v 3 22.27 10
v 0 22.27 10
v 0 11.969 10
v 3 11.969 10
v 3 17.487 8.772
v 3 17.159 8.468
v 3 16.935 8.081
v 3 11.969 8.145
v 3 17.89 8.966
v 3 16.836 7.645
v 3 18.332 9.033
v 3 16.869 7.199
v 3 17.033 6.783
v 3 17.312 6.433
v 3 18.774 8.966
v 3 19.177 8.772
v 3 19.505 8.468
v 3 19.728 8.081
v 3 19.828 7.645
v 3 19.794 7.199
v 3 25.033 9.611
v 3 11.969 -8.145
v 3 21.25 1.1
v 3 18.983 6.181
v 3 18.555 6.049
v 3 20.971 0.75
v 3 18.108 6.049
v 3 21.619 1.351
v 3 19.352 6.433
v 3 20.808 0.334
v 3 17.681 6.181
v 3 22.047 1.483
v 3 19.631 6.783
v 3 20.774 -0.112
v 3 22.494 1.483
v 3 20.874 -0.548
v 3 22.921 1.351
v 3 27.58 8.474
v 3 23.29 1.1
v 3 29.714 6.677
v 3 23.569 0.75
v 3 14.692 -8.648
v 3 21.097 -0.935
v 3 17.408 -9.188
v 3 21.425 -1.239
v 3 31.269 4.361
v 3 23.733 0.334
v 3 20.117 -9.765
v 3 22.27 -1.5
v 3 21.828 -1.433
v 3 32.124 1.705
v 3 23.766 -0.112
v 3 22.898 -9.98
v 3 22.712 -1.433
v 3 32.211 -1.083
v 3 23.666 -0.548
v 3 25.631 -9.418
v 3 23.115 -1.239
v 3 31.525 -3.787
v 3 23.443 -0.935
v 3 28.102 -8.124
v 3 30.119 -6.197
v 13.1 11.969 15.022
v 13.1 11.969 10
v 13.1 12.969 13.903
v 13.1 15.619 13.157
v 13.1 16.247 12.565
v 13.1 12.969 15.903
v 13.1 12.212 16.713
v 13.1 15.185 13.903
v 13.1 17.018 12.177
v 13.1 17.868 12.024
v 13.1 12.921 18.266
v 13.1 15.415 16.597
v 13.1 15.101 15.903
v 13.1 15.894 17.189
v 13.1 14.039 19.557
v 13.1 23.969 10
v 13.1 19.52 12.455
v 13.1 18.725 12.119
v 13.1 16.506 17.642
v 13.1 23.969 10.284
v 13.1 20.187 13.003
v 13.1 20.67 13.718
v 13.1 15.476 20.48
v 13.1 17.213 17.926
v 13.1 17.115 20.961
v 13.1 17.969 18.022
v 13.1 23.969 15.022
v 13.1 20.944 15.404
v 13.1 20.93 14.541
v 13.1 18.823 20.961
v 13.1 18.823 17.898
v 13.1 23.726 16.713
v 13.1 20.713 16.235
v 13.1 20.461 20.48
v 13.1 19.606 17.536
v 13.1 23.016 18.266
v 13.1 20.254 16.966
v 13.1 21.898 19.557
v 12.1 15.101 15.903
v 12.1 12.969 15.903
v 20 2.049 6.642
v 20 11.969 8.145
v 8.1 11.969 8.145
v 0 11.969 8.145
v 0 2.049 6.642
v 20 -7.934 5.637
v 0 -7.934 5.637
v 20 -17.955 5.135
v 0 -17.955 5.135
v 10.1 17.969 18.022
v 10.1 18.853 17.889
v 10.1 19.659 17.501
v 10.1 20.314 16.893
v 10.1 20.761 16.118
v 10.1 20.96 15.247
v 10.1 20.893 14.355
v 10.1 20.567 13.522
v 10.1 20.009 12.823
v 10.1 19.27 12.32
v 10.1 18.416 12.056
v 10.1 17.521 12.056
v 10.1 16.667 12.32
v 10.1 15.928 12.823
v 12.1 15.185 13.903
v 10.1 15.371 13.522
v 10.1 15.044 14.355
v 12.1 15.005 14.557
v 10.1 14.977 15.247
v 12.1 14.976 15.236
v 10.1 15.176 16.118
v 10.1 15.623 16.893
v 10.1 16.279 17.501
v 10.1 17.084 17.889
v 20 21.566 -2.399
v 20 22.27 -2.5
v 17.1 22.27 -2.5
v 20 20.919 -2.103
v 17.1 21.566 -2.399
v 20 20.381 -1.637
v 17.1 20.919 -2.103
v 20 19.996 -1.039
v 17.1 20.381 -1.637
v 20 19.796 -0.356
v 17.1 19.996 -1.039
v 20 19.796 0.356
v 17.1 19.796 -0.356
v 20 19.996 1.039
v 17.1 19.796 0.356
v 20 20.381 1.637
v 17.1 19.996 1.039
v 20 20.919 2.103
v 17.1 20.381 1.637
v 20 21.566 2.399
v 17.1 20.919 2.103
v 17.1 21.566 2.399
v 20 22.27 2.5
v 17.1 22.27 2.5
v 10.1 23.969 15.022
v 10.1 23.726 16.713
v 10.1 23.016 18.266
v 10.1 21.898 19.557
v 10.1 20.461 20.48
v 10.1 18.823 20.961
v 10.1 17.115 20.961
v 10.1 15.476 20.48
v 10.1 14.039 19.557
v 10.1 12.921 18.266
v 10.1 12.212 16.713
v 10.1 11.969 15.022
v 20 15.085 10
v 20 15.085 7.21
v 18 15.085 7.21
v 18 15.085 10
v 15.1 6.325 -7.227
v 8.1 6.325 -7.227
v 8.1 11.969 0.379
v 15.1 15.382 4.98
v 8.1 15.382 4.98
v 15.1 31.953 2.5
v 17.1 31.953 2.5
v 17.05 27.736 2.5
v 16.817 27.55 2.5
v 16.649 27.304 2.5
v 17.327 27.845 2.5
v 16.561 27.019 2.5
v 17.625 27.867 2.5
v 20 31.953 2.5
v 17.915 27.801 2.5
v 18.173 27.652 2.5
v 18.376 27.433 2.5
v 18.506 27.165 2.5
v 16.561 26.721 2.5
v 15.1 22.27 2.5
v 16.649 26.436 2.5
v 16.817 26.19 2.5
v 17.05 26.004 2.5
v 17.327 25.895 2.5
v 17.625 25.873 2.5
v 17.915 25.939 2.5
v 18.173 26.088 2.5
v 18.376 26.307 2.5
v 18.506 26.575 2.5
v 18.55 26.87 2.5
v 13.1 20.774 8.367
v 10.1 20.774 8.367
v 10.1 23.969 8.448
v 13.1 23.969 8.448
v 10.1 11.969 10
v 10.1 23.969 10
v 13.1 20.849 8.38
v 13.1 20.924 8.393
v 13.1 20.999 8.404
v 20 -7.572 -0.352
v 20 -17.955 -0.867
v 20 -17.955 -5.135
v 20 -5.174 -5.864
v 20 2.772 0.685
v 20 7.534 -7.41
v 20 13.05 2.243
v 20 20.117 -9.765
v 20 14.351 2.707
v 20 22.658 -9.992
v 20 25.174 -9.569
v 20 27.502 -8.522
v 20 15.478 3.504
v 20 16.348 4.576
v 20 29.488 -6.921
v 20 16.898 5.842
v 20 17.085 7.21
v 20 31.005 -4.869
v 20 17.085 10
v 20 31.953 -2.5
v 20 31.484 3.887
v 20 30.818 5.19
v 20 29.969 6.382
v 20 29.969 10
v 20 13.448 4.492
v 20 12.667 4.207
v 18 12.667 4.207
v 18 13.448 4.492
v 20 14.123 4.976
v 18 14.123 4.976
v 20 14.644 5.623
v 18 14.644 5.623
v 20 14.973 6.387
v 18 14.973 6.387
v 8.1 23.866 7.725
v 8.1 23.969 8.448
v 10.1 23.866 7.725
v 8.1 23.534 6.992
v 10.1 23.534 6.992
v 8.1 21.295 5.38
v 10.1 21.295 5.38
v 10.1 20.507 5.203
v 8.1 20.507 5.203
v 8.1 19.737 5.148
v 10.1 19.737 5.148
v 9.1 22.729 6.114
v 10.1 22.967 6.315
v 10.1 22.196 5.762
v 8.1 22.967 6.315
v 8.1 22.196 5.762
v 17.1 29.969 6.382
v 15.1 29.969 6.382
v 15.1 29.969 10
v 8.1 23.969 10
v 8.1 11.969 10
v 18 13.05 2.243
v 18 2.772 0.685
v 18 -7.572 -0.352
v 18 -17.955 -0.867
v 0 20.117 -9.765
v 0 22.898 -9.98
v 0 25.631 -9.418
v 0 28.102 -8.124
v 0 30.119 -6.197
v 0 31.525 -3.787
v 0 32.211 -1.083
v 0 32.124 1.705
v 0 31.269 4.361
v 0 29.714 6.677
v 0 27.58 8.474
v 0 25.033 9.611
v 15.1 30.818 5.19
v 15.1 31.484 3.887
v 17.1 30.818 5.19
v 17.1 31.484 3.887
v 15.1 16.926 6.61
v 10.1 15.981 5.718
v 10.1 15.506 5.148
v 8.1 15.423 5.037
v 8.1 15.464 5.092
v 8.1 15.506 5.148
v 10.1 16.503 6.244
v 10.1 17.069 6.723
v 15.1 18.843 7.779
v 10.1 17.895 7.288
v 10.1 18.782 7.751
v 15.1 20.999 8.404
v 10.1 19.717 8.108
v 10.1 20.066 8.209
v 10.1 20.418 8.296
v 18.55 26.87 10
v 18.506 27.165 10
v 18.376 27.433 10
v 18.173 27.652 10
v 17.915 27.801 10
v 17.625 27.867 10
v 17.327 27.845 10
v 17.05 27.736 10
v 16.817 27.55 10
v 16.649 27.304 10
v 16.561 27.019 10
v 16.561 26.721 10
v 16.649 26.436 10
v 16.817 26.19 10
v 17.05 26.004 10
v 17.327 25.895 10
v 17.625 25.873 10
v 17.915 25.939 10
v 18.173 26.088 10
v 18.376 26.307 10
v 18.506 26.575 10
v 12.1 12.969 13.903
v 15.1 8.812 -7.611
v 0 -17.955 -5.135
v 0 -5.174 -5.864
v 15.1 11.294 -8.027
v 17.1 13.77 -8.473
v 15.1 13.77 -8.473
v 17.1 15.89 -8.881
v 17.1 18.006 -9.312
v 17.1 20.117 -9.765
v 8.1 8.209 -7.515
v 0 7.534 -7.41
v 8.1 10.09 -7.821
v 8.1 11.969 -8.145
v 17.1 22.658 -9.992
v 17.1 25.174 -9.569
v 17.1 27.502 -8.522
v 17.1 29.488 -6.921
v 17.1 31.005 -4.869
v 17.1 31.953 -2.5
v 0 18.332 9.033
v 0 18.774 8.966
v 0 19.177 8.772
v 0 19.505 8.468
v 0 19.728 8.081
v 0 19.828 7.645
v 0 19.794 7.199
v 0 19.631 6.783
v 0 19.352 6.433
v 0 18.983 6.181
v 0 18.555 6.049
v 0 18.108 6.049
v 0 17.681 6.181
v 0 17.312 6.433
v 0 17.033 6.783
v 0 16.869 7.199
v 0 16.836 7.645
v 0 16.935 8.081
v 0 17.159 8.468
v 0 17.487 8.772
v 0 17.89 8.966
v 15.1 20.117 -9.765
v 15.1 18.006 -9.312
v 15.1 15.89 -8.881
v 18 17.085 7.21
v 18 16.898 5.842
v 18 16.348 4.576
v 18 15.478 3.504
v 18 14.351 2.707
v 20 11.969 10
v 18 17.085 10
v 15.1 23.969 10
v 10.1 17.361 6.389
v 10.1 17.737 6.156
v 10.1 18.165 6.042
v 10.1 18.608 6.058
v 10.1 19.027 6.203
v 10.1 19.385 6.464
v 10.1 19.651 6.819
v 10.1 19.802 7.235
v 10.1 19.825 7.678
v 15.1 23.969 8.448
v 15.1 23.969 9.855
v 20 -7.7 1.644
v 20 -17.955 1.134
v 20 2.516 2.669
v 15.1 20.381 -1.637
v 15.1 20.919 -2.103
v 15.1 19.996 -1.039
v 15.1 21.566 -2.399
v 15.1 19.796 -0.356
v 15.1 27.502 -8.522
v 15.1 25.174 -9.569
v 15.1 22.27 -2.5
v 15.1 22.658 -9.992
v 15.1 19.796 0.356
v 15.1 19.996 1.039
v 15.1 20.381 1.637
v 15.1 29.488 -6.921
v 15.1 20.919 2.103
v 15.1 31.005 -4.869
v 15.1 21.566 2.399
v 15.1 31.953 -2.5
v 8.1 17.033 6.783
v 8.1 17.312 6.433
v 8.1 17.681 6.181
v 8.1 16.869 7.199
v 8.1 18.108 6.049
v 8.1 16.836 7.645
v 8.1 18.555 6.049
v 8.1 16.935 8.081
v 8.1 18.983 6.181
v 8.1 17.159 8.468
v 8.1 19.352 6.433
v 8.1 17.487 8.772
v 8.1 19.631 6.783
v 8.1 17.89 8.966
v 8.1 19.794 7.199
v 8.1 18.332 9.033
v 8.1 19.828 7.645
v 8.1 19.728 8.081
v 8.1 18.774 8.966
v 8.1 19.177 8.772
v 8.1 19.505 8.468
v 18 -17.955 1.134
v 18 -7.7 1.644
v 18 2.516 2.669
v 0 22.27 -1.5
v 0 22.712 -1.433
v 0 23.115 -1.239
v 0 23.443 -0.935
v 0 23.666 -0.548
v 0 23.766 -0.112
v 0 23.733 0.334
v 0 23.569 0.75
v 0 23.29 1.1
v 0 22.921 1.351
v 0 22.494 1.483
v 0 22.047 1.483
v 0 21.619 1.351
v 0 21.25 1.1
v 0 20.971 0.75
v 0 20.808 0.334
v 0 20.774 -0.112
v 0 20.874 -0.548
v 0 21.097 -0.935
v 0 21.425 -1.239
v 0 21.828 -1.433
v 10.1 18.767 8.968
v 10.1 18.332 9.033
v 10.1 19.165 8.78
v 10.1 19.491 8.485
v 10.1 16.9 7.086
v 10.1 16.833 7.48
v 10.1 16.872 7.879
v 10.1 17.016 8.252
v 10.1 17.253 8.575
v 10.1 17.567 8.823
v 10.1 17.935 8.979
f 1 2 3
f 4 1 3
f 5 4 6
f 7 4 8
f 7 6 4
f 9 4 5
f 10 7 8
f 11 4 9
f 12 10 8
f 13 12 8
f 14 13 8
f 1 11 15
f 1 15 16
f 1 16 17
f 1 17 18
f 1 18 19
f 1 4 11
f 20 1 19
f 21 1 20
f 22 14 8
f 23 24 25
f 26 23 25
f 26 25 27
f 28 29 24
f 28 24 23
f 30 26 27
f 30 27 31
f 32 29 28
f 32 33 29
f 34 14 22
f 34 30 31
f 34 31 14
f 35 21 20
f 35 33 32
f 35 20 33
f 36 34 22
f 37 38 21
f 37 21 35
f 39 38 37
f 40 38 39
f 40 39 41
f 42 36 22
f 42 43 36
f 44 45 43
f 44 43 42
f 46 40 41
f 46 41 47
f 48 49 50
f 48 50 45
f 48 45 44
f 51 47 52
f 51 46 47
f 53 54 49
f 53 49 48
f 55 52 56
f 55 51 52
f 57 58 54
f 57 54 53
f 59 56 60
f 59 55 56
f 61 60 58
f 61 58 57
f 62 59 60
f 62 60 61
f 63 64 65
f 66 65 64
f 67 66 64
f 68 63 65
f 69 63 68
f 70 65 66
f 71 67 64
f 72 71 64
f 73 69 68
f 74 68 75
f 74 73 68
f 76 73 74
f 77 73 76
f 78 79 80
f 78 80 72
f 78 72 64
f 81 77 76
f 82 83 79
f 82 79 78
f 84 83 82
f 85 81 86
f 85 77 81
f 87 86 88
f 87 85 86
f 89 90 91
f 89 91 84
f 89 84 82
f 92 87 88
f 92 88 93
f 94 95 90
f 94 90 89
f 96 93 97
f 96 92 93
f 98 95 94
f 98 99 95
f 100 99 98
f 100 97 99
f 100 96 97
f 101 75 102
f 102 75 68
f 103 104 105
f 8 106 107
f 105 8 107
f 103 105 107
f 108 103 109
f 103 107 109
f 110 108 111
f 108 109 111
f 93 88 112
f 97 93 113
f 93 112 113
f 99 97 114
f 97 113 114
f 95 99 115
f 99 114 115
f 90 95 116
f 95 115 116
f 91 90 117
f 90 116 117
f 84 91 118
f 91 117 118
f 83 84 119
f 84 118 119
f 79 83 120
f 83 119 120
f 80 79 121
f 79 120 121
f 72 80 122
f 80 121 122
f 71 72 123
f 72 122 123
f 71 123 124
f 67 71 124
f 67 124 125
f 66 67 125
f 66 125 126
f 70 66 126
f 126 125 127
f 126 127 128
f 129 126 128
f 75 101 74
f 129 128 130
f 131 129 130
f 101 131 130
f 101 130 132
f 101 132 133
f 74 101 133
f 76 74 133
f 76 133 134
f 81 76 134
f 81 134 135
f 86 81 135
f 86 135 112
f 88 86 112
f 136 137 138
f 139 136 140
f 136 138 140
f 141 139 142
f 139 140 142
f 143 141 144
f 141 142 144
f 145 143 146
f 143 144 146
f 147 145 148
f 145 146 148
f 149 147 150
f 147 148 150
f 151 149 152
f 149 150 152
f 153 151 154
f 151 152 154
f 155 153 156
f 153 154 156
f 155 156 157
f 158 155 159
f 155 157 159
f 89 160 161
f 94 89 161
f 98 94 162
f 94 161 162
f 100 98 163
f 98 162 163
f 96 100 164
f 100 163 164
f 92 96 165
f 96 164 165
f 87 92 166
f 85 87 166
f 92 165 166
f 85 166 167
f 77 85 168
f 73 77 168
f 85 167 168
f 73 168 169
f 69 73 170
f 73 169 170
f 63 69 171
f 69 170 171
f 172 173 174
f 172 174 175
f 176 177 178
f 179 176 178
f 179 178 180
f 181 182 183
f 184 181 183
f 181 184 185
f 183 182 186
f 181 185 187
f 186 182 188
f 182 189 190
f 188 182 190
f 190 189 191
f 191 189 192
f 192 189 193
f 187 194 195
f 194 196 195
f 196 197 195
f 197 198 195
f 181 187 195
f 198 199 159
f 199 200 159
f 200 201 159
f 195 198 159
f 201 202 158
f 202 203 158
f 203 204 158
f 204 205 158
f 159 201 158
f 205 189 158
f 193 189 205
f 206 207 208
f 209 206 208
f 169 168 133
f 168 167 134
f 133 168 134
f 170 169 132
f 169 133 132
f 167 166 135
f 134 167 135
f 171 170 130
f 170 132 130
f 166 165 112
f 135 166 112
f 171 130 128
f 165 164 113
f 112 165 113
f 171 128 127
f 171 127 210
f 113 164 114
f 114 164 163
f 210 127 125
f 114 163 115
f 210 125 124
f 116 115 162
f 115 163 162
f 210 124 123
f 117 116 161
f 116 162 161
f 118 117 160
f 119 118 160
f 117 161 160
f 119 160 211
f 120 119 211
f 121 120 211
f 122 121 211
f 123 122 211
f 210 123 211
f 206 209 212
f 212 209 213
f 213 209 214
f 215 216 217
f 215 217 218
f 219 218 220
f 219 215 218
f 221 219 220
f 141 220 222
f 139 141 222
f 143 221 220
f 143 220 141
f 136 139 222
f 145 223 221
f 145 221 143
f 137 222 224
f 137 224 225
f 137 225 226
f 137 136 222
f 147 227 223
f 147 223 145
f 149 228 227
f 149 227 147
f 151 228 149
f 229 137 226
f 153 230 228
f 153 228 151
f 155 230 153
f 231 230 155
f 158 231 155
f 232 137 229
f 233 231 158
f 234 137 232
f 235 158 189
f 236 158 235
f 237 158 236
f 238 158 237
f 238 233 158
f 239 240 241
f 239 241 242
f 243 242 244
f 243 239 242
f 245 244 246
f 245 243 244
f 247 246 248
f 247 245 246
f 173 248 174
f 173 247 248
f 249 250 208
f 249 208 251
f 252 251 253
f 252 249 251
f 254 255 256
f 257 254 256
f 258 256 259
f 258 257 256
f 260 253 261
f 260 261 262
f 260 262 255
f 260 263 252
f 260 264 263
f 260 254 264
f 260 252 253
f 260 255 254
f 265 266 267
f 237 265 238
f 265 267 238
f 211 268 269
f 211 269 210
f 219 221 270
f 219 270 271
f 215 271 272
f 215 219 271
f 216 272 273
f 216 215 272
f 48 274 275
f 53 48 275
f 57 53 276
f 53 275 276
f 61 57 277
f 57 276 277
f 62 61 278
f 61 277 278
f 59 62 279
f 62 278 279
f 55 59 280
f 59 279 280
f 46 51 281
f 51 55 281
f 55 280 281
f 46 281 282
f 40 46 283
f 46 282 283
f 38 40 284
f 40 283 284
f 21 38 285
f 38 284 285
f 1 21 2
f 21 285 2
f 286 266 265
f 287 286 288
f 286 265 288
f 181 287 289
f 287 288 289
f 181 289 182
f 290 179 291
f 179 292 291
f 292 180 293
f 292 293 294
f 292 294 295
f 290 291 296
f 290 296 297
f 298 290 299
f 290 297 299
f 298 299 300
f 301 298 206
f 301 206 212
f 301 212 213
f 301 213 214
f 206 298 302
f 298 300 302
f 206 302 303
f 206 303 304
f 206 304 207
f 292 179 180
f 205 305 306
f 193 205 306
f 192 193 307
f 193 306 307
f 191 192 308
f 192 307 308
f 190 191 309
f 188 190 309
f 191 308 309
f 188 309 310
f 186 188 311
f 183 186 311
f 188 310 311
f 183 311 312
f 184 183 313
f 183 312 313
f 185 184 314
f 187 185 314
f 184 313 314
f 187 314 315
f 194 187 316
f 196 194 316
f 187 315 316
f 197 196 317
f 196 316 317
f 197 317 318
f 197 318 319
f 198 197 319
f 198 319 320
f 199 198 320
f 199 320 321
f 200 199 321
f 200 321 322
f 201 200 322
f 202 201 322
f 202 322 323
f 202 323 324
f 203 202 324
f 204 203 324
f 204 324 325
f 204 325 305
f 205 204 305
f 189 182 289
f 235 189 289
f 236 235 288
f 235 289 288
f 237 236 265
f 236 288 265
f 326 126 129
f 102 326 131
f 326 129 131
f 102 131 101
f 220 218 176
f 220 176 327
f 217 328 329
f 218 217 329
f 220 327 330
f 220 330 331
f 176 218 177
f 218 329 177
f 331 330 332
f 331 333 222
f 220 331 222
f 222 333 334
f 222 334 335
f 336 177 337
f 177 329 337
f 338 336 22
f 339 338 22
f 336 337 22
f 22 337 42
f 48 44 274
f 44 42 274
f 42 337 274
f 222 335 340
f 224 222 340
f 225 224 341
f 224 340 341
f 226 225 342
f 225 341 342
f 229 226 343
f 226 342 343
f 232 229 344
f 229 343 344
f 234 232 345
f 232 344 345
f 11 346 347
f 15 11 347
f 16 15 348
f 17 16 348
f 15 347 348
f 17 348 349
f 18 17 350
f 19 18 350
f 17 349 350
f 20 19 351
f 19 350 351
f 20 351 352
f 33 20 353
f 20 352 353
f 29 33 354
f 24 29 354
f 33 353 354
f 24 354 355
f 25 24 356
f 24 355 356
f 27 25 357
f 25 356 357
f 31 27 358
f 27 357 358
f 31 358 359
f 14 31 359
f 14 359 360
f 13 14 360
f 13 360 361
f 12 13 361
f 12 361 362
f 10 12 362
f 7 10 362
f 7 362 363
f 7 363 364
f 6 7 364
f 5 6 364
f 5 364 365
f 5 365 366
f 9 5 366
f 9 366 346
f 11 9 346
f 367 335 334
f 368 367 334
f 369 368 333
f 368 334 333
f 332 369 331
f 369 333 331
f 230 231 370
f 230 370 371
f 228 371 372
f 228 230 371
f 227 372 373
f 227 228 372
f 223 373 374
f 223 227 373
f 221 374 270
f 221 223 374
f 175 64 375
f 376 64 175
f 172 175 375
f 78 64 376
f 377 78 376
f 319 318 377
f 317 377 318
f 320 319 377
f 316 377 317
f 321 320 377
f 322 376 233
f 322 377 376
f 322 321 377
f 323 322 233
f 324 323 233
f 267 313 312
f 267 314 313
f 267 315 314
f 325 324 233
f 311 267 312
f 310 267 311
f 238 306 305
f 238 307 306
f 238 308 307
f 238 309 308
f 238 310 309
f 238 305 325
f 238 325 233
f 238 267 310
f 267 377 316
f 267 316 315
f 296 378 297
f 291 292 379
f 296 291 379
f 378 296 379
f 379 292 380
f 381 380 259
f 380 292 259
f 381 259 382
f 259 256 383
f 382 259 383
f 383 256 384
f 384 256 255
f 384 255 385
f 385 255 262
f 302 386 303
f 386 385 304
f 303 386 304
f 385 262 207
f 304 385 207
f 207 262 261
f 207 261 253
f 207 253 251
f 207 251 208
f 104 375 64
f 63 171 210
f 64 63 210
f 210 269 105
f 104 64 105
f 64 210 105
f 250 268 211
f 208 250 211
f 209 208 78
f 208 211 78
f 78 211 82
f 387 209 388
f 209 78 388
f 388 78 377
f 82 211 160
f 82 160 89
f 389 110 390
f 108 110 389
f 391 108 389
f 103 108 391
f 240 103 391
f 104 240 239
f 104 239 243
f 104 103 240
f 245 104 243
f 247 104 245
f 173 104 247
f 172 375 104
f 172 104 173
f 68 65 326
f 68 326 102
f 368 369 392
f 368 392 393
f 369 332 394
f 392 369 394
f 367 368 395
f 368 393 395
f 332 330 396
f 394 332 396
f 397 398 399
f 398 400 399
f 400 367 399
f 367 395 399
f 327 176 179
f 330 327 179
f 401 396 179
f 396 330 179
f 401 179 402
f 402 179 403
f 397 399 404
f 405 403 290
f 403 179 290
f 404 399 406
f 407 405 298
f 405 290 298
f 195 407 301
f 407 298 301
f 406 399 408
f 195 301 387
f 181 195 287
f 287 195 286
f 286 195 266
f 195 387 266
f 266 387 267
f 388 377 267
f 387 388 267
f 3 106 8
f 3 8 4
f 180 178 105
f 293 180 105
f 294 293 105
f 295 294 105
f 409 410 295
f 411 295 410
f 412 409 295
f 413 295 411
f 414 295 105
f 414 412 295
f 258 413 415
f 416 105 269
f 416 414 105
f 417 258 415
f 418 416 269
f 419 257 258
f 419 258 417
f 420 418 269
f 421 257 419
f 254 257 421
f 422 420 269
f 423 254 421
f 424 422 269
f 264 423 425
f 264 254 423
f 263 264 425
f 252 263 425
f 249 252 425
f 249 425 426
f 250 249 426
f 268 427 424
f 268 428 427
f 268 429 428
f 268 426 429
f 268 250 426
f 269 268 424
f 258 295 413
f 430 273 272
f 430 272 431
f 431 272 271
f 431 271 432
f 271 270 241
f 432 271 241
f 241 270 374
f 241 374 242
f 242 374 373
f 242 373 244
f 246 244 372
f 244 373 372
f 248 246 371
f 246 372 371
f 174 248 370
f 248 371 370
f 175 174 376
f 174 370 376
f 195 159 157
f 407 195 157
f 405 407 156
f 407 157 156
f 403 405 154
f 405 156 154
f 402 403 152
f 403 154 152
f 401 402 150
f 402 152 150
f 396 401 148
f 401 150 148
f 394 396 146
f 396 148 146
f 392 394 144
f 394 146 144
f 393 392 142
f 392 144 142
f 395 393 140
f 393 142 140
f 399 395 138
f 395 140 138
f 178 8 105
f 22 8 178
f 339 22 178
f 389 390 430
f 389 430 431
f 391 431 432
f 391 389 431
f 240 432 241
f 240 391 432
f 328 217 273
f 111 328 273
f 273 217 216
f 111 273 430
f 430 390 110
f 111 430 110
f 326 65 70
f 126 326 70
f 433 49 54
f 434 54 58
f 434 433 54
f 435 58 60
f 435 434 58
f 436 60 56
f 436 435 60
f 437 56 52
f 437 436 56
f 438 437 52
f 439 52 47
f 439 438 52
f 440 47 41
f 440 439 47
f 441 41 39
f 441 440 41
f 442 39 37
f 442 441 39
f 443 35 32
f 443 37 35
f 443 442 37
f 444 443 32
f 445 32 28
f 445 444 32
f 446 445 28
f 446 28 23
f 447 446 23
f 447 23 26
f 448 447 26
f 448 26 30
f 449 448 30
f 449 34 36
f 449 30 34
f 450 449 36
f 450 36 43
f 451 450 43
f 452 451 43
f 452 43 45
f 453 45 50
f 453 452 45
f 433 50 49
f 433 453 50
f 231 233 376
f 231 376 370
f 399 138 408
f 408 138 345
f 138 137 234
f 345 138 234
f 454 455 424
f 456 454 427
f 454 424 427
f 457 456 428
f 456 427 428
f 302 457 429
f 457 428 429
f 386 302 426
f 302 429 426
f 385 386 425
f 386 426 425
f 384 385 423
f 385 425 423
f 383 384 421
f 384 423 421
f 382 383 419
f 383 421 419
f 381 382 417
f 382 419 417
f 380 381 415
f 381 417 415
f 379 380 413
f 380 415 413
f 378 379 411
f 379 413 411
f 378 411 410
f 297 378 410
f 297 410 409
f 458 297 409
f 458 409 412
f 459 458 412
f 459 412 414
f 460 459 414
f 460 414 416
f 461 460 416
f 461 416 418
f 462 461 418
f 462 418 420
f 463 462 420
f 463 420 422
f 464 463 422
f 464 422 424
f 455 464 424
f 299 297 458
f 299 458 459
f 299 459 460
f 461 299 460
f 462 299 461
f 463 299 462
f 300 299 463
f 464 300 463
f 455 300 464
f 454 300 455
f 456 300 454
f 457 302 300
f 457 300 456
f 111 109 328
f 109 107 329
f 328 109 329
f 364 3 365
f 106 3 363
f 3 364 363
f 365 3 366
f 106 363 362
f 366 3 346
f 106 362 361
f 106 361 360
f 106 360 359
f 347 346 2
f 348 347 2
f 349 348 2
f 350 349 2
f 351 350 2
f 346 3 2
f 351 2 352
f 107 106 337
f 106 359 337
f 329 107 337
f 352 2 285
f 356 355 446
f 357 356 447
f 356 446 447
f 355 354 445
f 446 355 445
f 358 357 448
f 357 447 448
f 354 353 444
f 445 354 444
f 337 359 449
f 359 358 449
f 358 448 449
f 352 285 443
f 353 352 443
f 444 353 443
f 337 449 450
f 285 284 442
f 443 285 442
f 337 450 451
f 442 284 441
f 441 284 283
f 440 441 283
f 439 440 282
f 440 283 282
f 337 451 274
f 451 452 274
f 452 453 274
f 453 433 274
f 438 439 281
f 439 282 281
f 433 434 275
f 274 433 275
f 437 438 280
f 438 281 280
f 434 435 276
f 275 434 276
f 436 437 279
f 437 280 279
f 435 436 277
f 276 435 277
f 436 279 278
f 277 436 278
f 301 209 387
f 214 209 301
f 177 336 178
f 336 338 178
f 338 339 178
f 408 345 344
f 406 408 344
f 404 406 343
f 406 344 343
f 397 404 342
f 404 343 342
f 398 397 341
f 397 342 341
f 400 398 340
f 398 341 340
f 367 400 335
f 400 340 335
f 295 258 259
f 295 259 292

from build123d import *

# Parameters (mm, degrees)
SKETCH1_R                = 1.5
SKETCH1_R_2              = 2.5
BOSS_EXTRUDE1_DEPTH      = 20
SKETCH2_W                = 8.1
SKETCH2_H                = 20
SKETCH2_W_2              = 5.2
SKETCH2_W_3              = 5.1
CUT_EXTRUDE1_DEPTH       = 20
CUT_EXTRUDE1_DEPTH_BACK  = 20
CUT_EXTRUDE2_DEPTH       = 9
BOSS_EXTRUDE2_DEPTH      = 11.9
SKETCH5_R                = 3
BOSS_EXTRUDE3_DEPTH      = 5
CUT_EXTRUDE6_DEPTH       = 1
SKETCH13_R               = 2.5
CUT_EXTRUDE7_DEPTH       = 4
BOSS_EXTRUDE4_DEPTH      = 3
CUT_EXTRUDE9_DEPTH       = 3
SKETCH17_W               = 9
SKETCH17_H               = 3.569322199
CUT_EXTRUDE11_DEPTH      = 3
SKETCH18_W               = 5.770974844
SKETCH18_H               = 0.772936936
BOSS_EXTRUDE5_DEPTH      = 6.9
BOSS_EXTRUDE5_DEPTH_BACK = 1
SKETCH19_W               = 5.1
SKETCH19_H               = 16.397725614
CUT_EXTRUDE12_DEPTH      = 0.301495
SKETCH20_W               = 5
SKETCH20_H               = 12.419235667
CUT_EXTRUDE13_DEPTH      = 10
BOSS_EXTRUDE6_DEPTH      = 2
SKETCH23_W               = 4.9
SKETCH23_H               = 6
BOSS_EXTRUDE7_DEPTH      = 4
SKETCH22_R               = 1
CUT_EXTRUDE15_DEPTH      = 8
BOSS_EXTRUDE8_DEPTH      = 2
SKETCH14_R               = 1.5
CUT_EXTRUDE8_DEPTH       = 10.1
CUT_EXTRUDE17_DEPTH      = 8.1
CUT_EXTRUDE17_DEPTH_BACK = 2
CUT_EXTRUDE18_DEPTH      = 2
CUT_EXTRUDE20_DEPTH      = 5.2
SKETCH30_W               = 6.9
SKETCH30_H               = 20
CUT_EXTRUDE21_DEPTH      = 0.283797
CUT_EXTRUDE22_REACH      = 91.699
SKETCH31_W               = 2
SKETCH31_H               = 11.022421386
CUT_EXTRUDE23_DEPTH      = 7
CUT_EXTRUDE24_DEPTH      = 21
SKETCH34_W               = 60.526432738
SKETCH34_H               = 58.455185991
CUT_EXTRUDE25_DEPTH      = 21


with BuildPart() as part:
    # Sketch1 → Boss-Extrude1 (new body)
    with BuildSketch(Plane(origin=(0, 0, 0), x_dir=(0, 0, -1), z_dir=(1, 0, 0))):
        with BuildLine():
            ThreePointArc((9.765353557, 20.116545894), (0, 32.270117322), (-9.765353557, 20.116545894))
            ThreePointArc((-9.765353557, 20.116545894), (-5.132645827, -18.047253777), (-7.88740095, -56.392382678))
            ThreePointArc((-7.88740095, -56.392382678), (0, -65.729882678), (7.88740095, -56.392382678))
            ThreePointArc((7.88740095, -56.392382678), (5.132645827, -18.047253777), (9.765353557, 20.116545894))
        make_face()
        with Locations((0, 22.270117322)):
            Circle(SKETCH1_R, mode=Mode.SUBTRACT)
        with Locations((0, -57.729882678)):
            Circle(SKETCH1_R_2, mode=Mode.SUBTRACT)
    extrude(amount=BOSS_EXTRUDE1_DEPTH)

    # Sketch2 → Cut-Extrude1 (cut, two sides)
    with BuildSketch(Plane.XY) as cut_extrude1_sk:
        with Locations((4.05, -55.729882678)):
            Rectangle(SKETCH2_W, SKETCH2_H)
        with Locations((17.4, -55.729882678)):
            Rectangle(SKETCH2_W_2, SKETCH2_H)
        with Locations((5.55, 22.270117322)):
            Rectangle(SKETCH2_W_3, SKETCH2_H)
    extrude(amount=CUT_EXTRUDE1_DEPTH, mode=Mode.SUBTRACT)
    extrude(cut_extrude1_sk.sketch, amount=-CUT_EXTRUDE1_DEPTH_BACK, mode=Mode.SUBTRACT)

    # Sketch3 → Cut-Extrude2 (cut)
    with BuildSketch(Plane.ZY.offset(-8.1)):
        with BuildLine():
            Line((8.5, 22.270117322), (8.5, 40.909533312))
            Line((8.5, 40.909533312), (-17.52872033, 40.909533312))
            Line((-17.52872033, 40.909533312), (-17.52872033, 13.770117322))
            Line((-17.52872033, 13.770117322), (0, 13.770117322))
            ThreePointArc((0, 13.770117322), (6.01040764, 16.259709682), (8.5, 22.270117322))
        make_face()
    extrude(amount=-CUT_EXTRUDE2_DEPTH, mode=Mode.SUBTRACT)

    # Sketch4 → Boss-Extrude2 (add, through all)
    with BuildSketch(Plane.ZY.offset(-8.1)):
        Polygon((8.5, 27.537944199), (8.283796844, 12.741558936), (10.283796844, 12.741558936), (10.283796844, 27.537944199), align=None)
    extrude(amount=-BOSS_EXTRUDE2_DEPTH)

    # Sketch5 → Boss-Extrude3 (add)
    with BuildSketch(Plane.ZY.offset(-8.1)):
        with BuildLine():
            Line((8.145156861, 11.968622), (8.447845456, 23.968622))
            Line((8.447845456, 23.968622), (9.854698466, 23.968622))
            Line((9.854698466, 23.968622), (15.022421386, 23.968622))
            ThreePointArc((15.022421386, 23.968622), (21.022421386, 17.968622), (15.022421386, 11.968622))
            Line((15.022421386, 11.968622), (8.145156861, 11.968622))
        make_face()
        with Locations((15.022421386, 17.968622)):
            Circle(SKETCH5_R, mode=Mode.SUBTRACT)
    extrude(amount=-BOSS_EXTRUDE3_DEPTH)

    # Sketch12 → Cut-Extrude6 (cut)
    with BuildSketch(Plane(origin=(13.1, 0, 0), x_dir=(0, 0, -1), z_dir=(1, 0, 0))):
        Polygon((-13.902900694, 14.968622), (-13.902900694, 12.968622), (-15.902900694, 12.968622), (-15.902900694, 14.968622), (-15.902900694, 15.294296094), (-13.902900694, 15.294296094), align=None)
    extrude(amount=-CUT_EXTRUDE6_DEPTH, mode=Mode.SUBTRACT)

    # Sketch13 → Cut-Extrude7 (cut)
    with BuildSketch(Plane.ZY.offset(-17.1)):
        with Locations((0, 22.270117322)):
            Circle(SKETCH13_R)
    extrude(amount=-CUT_EXTRUDE7_DEPTH, mode=Mode.SUBTRACT)

    # Sketch15 → Boss-Extrude4 (add)
    with BuildSketch(Plane.ZY):
        Polygon((10, 22.270117322), (10, 11.968622), (8.145156861, 11.968622), (7.595672539, 11.968622), align=None)
    extrude(amount=-BOSS_EXTRUDE4_DEPTH)

    # Sketch16 → Cut-Extrude9 (cut)
    with BuildSketch(Plane(origin=(20, 0, 0), x_dir=(0, 0, -1), z_dir=(1, 0, 0))):
        with BuildLine():
            Line((-10.283796844, 23.968622), (-9.854698466, 23.968622))
            ThreePointArc((-9.854698466, 23.968622), (-9.349264901, 25.818531871), (-8.5, 27.537944199))
            Line((-8.5, 27.537944199), (-10.283796844, 27.537944199))
            Line((-10.283796844, 27.537944199), (-10.283796844, 23.968622))
        make_face()
    extrude(amount=-CUT_EXTRUDE9_DEPTH, mode=Mode.SUBTRACT)

    # Sketch17 → Cut-Extrude11 (cut)
    with BuildSketch(Plane.XY.offset(10.283796844)):
        with Locations((12.6, 25.7532831)):
            Rectangle(SKETCH17_W, SKETCH17_H)
    extrude(amount=-CUT_EXTRUDE11_DEPTH, mode=Mode.SUBTRACT)

    # Sketch18 → Boss-Extrude5 (add, two sides)
    with BuildSketch(Plane(origin=(13.1, 0, 0), x_dir=(0, 0, -1), z_dir=(1, 0, 0))) as boss_extrude5_sk:
        with Locations((-7.398309422, 12.355090468)):
            Rectangle(SKETCH18_W, SKETCH18_H)
    extrude(amount=BOSS_EXTRUDE5_DEPTH)
    extrude(boss_extrude5_sk.sketch, amount=-BOSS_EXTRUDE5_DEPTH_BACK)

    # Sketch19 → Cut-Extrude12 (cut)
    with BuildSketch(Plane(origin=(0, 12.270117322, 0), x_dir=(1, 0, 0), z_dir=(0, 1, 0))):
        with Locations((5.55, 0)):
            Rectangle(SKETCH19_W, SKETCH19_H)
    extrude(amount=-CUT_EXTRUDE12_DEPTH, mode=Mode.SUBTRACT)

    # Sketch20 → Cut-Extrude13 (cut)
    with BuildSketch(Plane.ZY.offset(-17.1)):
        with Locations((0, 28.479735156)):
            Rectangle(SKETCH20_W, SKETCH20_H)
    extrude(amount=-CUT_EXTRUDE13_DEPTH, mode=Mode.SUBTRACT)

    # Sketch21 → Boss-Extrude6 (add)
    with BuildSketch(Plane.ZY.offset(-17.1)):
        with BuildLine():
            Line((-8.473151119, 13.770117322), (0.278481736, 12.273995678))
            ThreePointArc((0.278481736, 12.273995678), (9.936881703, 21.148341047), (2.5, 31.952575688))
            Line((2.5, 31.952575688), (2.5, 22.270117322))
            ThreePointArc((2.5, 22.270117322), (0, 19.770117322), (-2.5, 22.270117322))
            Line((-2.5, 22.270117322), (-2.5, 31.952575688))
            ThreePointArc((-2.5, 31.952575688), (-8.522477621, 27.501501002), (-9.765353557, 20.116545894))
            ThreePointArc((-9.765353557, 20.116545894), (-9.093560923, 16.948562662), (-8.473151119, 13.770117322))
        make_face()
    extrude(amount=BOSS_EXTRUDE6_DEPTH)

    # Sketch23 → Boss-Extrude7 (add)
    with BuildSketch(Plane.XY.offset(10.283796844)):
        with Locations((17.55, 26.968622)):
            Rectangle(SKETCH23_W, SKETCH23_H)
    extrude(amount=-BOSS_EXTRUDE7_DEPTH)

    # Sketch22 → Cut-Extrude15 (cut)
    with BuildSketch(Plane.XY.offset(10.283796844)):
        with Locations((17.55, 26.870117322)):
            Circle(SKETCH22_R)
    extrude(amount=-CUT_EXTRUDE15_DEPTH, mode=Mode.SUBTRACT)

    # Sketch24 → Boss-Extrude8 (add)
    with BuildSketch(Plane.ZY.offset(-8.1)):
        with BuildLine():
            Line((5.147845456, 19.737443909), (5.147845456, 15.506265819))
            Line((5.147845456, 15.506265819), (8.447845456, 15.506265819))
            Line((8.447845456, 15.506265819), (8.447845456, 23.968622))
            add(Edge.make_bspline(
                [(8.447845456, 23.968622), (5.147845456, 23.968622), (5.147845456, 19.737443909)],
                knots=[3.141592654, 3.141592654, 3.141592654, 4.71238898, 4.71238898, 4.71238898], degree=2, weights=[1, 0.707106781, 1]))
        make_face()
    extrude(amount=-BOSS_EXTRUDE8_DEPTH)

    # Sketch14 → Cut-Extrude8 (cut)
    with BuildSketch(Plane.ZY):
        with Locations((7.532575614, 18.331804915)):
            Circle(SKETCH14_R)
    extrude(amount=-CUT_EXTRUDE8_DEPTH, mode=Mode.SUBTRACT)

    # Sketch25 → Cut-Extrude17 (cut, two sides)
    with BuildSketch(Plane.ZY.offset(-8.1)) as cut_extrude17_sk:
        with BuildLine():
            Line((12, -45.729882678), (8.346153846, -36.960651908))
            ThreePointArc((8.346153846, -36.960651908), (6.973852263, -42.37911752), (2.5, -45.729882678))
            Line((2.5, -45.729882678), (2.5, -53.227383372))
            ThreePointArc((2.5, -53.227383372), (0, -62.879882678), (-2.5, -53.227383372))
            Line((-2.5, -53.227383372), (-2.5, -45.729882678))
            ThreePointArc((-2.5, -45.729882678), (-6.973852263, -42.37911752), (-8.346153846, -36.960651908))
            Line((-8.346153846, -36.960651908), (-12, -45.729882678))
            Line((-12, -45.729882678), (-12, -57.729882678))
            ThreePointArc((-12, -57.729882678), (0, -69.729882678), (12, -57.729882678))
            Line((12, -57.729882678), (12, -45.729882678))
        make_face()
    extrude(amount=CUT_EXTRUDE17_DEPTH, mode=Mode.SUBTRACT)
    extrude(cut_extrude17_sk.sketch, amount=-CUT_EXTRUDE17_DEPTH_BACK, mode=Mode.SUBTRACT)

    # Sketch26 → Cut-Extrude18 (cut)
    with BuildSketch(Plane(origin=(20, 0, 0), x_dir=(0, 0, -1), z_dir=(1, 0, 0))):
        with BuildLine():
            Line((-7.209968303, 15.085404497), (-10.283796844, 15.085404497))
            Line((-10.283796844, 15.085404497), (-10.283796844, 17.085404497))
            Line((-10.283796844, 17.085404497), (-7.209968303, 17.085404497))
            ThreePointArc((-7.209968303, 17.085404497), (-4.010444351, 15.949526558), (-2.243391617, 13.050441039))
            ThreePointArc((-2.243391617, 13.050441039), (0.649659998, -12.257973546), (0.397031114, -37.729953741))
            Line((0.397031114, -37.729953741), (-1.608183929, -37.729953741))
            ThreePointArc((-1.608183929, -37.729953741), (-1.343036313, -12.450773719), (-4.206611504, 12.667092093))
            ThreePointArc((-4.206611504, 12.667092093), (-5.281990934, 14.405678614), (-7.209968303, 15.085404497))
        make_face()
    extrude(amount=-CUT_EXTRUDE18_DEPTH, mode=Mode.SUBTRACT)

    # Sketch29 → Cut-Extrude20 (cut)
    with BuildSketch(Plane(origin=(20, 0, 0), x_dir=(0, 0, -1), z_dir=(1, 0, 0))):
        with BuildLine():
            Line((8, -37.729882678), (8.140336581, -37.729882678))
            Line((8.140336581, -37.729882678), (8.140336581, -45.937498976))
            Line((8.140336581, -45.937498976), (-15.754893946, -45.937498976))
            Line((-15.754893946, -45.937498976), (-15.754893946, -37.729882678))
            Line((-15.754893946, -37.729882678), (-8, -37.729882678))
            ThreePointArc((-8, -37.729882678), (0, -45.729882678), (8, -37.729882678))
        make_face()
    extrude(amount=-CUT_EXTRUDE20_DEPTH, mode=Mode.SUBTRACT)

    # Sketch30 → Cut-Extrude21 (cut)
    with BuildSketch(Plane.XY.offset(10.283796844)):
        with Locations((16.55, 21.968622)):
            Rectangle(SKETCH30_W, SKETCH30_H)
    extrude(amount=-CUT_EXTRUDE21_DEPTH, mode=Mode.SUBTRACT)

    # Sketch31 → Cut-Extrude22 (cut, up to next)
    with BuildSketch(Plane(origin=(0, 23.968622, 0), x_dir=(1, 0, 0), z_dir=(0, 1, 0)), mode=Mode.PRIVATE) as cut_extrude22_sk1:
        with Locations((9.1, -15.511210693)):
            Rectangle(SKETCH31_W, SKETCH31_H)
    cut_extrude22_tool1 = extrude(cut_extrude22_sk1.sketch, amount=-CUT_EXTRUDE22_REACH, mode=Mode.PRIVATE) & part.part
    add(cut_extrude22_tool1.solids().sort_by_distance((9.1, 23.968622, 15.511211))[0], mode=Mode.SUBTRACT)

    # Sketch32 → Cut-Extrude23 (cut)
    with BuildSketch(Plane.ZY.offset(-8.1)):
        Polygon((-8.473151119, 13.770117322), (-8.473151119, 5.401068454), (5.147845456, 15.506265819), align=None)
    extrude(amount=-CUT_EXTRUDE23_DEPTH, mode=Mode.SUBTRACT)

    # Sketch33 → Cut-Extrude24 (cut, through all)
    with BuildSketch(Plane(origin=(20, 0, 0), x_dir=(0, 0, -1), z_dir=(1, 0, 0))):
        Polygon((-9.30475326, -22.954882678), (-9.30475326, -27.954882678), (8.892389241, -27.954882678), (8.892389241, -22.954882678), (8.892389241, -17.954882678), (-9.30475326, -17.954882678), align=None)
    extrude(amount=-CUT_EXTRUDE24_DEPTH, mode=Mode.SUBTRACT)

    # Sketch34 → Cut-Extrude25 (cut, through all)
    with BuildSketch(Plane(origin=(20, 0, 0), x_dir=(0, 0, -1), z_dir=(1, 0, 0))):
        with Locations((-5.515206789, -53.322694673)):
            Rectangle(SKETCH34_W, SKETCH34_H)
    extrude(amount=-CUT_EXTRUDE25_DEPTH, mode=Mode.SUBTRACT)


solid = part.part
